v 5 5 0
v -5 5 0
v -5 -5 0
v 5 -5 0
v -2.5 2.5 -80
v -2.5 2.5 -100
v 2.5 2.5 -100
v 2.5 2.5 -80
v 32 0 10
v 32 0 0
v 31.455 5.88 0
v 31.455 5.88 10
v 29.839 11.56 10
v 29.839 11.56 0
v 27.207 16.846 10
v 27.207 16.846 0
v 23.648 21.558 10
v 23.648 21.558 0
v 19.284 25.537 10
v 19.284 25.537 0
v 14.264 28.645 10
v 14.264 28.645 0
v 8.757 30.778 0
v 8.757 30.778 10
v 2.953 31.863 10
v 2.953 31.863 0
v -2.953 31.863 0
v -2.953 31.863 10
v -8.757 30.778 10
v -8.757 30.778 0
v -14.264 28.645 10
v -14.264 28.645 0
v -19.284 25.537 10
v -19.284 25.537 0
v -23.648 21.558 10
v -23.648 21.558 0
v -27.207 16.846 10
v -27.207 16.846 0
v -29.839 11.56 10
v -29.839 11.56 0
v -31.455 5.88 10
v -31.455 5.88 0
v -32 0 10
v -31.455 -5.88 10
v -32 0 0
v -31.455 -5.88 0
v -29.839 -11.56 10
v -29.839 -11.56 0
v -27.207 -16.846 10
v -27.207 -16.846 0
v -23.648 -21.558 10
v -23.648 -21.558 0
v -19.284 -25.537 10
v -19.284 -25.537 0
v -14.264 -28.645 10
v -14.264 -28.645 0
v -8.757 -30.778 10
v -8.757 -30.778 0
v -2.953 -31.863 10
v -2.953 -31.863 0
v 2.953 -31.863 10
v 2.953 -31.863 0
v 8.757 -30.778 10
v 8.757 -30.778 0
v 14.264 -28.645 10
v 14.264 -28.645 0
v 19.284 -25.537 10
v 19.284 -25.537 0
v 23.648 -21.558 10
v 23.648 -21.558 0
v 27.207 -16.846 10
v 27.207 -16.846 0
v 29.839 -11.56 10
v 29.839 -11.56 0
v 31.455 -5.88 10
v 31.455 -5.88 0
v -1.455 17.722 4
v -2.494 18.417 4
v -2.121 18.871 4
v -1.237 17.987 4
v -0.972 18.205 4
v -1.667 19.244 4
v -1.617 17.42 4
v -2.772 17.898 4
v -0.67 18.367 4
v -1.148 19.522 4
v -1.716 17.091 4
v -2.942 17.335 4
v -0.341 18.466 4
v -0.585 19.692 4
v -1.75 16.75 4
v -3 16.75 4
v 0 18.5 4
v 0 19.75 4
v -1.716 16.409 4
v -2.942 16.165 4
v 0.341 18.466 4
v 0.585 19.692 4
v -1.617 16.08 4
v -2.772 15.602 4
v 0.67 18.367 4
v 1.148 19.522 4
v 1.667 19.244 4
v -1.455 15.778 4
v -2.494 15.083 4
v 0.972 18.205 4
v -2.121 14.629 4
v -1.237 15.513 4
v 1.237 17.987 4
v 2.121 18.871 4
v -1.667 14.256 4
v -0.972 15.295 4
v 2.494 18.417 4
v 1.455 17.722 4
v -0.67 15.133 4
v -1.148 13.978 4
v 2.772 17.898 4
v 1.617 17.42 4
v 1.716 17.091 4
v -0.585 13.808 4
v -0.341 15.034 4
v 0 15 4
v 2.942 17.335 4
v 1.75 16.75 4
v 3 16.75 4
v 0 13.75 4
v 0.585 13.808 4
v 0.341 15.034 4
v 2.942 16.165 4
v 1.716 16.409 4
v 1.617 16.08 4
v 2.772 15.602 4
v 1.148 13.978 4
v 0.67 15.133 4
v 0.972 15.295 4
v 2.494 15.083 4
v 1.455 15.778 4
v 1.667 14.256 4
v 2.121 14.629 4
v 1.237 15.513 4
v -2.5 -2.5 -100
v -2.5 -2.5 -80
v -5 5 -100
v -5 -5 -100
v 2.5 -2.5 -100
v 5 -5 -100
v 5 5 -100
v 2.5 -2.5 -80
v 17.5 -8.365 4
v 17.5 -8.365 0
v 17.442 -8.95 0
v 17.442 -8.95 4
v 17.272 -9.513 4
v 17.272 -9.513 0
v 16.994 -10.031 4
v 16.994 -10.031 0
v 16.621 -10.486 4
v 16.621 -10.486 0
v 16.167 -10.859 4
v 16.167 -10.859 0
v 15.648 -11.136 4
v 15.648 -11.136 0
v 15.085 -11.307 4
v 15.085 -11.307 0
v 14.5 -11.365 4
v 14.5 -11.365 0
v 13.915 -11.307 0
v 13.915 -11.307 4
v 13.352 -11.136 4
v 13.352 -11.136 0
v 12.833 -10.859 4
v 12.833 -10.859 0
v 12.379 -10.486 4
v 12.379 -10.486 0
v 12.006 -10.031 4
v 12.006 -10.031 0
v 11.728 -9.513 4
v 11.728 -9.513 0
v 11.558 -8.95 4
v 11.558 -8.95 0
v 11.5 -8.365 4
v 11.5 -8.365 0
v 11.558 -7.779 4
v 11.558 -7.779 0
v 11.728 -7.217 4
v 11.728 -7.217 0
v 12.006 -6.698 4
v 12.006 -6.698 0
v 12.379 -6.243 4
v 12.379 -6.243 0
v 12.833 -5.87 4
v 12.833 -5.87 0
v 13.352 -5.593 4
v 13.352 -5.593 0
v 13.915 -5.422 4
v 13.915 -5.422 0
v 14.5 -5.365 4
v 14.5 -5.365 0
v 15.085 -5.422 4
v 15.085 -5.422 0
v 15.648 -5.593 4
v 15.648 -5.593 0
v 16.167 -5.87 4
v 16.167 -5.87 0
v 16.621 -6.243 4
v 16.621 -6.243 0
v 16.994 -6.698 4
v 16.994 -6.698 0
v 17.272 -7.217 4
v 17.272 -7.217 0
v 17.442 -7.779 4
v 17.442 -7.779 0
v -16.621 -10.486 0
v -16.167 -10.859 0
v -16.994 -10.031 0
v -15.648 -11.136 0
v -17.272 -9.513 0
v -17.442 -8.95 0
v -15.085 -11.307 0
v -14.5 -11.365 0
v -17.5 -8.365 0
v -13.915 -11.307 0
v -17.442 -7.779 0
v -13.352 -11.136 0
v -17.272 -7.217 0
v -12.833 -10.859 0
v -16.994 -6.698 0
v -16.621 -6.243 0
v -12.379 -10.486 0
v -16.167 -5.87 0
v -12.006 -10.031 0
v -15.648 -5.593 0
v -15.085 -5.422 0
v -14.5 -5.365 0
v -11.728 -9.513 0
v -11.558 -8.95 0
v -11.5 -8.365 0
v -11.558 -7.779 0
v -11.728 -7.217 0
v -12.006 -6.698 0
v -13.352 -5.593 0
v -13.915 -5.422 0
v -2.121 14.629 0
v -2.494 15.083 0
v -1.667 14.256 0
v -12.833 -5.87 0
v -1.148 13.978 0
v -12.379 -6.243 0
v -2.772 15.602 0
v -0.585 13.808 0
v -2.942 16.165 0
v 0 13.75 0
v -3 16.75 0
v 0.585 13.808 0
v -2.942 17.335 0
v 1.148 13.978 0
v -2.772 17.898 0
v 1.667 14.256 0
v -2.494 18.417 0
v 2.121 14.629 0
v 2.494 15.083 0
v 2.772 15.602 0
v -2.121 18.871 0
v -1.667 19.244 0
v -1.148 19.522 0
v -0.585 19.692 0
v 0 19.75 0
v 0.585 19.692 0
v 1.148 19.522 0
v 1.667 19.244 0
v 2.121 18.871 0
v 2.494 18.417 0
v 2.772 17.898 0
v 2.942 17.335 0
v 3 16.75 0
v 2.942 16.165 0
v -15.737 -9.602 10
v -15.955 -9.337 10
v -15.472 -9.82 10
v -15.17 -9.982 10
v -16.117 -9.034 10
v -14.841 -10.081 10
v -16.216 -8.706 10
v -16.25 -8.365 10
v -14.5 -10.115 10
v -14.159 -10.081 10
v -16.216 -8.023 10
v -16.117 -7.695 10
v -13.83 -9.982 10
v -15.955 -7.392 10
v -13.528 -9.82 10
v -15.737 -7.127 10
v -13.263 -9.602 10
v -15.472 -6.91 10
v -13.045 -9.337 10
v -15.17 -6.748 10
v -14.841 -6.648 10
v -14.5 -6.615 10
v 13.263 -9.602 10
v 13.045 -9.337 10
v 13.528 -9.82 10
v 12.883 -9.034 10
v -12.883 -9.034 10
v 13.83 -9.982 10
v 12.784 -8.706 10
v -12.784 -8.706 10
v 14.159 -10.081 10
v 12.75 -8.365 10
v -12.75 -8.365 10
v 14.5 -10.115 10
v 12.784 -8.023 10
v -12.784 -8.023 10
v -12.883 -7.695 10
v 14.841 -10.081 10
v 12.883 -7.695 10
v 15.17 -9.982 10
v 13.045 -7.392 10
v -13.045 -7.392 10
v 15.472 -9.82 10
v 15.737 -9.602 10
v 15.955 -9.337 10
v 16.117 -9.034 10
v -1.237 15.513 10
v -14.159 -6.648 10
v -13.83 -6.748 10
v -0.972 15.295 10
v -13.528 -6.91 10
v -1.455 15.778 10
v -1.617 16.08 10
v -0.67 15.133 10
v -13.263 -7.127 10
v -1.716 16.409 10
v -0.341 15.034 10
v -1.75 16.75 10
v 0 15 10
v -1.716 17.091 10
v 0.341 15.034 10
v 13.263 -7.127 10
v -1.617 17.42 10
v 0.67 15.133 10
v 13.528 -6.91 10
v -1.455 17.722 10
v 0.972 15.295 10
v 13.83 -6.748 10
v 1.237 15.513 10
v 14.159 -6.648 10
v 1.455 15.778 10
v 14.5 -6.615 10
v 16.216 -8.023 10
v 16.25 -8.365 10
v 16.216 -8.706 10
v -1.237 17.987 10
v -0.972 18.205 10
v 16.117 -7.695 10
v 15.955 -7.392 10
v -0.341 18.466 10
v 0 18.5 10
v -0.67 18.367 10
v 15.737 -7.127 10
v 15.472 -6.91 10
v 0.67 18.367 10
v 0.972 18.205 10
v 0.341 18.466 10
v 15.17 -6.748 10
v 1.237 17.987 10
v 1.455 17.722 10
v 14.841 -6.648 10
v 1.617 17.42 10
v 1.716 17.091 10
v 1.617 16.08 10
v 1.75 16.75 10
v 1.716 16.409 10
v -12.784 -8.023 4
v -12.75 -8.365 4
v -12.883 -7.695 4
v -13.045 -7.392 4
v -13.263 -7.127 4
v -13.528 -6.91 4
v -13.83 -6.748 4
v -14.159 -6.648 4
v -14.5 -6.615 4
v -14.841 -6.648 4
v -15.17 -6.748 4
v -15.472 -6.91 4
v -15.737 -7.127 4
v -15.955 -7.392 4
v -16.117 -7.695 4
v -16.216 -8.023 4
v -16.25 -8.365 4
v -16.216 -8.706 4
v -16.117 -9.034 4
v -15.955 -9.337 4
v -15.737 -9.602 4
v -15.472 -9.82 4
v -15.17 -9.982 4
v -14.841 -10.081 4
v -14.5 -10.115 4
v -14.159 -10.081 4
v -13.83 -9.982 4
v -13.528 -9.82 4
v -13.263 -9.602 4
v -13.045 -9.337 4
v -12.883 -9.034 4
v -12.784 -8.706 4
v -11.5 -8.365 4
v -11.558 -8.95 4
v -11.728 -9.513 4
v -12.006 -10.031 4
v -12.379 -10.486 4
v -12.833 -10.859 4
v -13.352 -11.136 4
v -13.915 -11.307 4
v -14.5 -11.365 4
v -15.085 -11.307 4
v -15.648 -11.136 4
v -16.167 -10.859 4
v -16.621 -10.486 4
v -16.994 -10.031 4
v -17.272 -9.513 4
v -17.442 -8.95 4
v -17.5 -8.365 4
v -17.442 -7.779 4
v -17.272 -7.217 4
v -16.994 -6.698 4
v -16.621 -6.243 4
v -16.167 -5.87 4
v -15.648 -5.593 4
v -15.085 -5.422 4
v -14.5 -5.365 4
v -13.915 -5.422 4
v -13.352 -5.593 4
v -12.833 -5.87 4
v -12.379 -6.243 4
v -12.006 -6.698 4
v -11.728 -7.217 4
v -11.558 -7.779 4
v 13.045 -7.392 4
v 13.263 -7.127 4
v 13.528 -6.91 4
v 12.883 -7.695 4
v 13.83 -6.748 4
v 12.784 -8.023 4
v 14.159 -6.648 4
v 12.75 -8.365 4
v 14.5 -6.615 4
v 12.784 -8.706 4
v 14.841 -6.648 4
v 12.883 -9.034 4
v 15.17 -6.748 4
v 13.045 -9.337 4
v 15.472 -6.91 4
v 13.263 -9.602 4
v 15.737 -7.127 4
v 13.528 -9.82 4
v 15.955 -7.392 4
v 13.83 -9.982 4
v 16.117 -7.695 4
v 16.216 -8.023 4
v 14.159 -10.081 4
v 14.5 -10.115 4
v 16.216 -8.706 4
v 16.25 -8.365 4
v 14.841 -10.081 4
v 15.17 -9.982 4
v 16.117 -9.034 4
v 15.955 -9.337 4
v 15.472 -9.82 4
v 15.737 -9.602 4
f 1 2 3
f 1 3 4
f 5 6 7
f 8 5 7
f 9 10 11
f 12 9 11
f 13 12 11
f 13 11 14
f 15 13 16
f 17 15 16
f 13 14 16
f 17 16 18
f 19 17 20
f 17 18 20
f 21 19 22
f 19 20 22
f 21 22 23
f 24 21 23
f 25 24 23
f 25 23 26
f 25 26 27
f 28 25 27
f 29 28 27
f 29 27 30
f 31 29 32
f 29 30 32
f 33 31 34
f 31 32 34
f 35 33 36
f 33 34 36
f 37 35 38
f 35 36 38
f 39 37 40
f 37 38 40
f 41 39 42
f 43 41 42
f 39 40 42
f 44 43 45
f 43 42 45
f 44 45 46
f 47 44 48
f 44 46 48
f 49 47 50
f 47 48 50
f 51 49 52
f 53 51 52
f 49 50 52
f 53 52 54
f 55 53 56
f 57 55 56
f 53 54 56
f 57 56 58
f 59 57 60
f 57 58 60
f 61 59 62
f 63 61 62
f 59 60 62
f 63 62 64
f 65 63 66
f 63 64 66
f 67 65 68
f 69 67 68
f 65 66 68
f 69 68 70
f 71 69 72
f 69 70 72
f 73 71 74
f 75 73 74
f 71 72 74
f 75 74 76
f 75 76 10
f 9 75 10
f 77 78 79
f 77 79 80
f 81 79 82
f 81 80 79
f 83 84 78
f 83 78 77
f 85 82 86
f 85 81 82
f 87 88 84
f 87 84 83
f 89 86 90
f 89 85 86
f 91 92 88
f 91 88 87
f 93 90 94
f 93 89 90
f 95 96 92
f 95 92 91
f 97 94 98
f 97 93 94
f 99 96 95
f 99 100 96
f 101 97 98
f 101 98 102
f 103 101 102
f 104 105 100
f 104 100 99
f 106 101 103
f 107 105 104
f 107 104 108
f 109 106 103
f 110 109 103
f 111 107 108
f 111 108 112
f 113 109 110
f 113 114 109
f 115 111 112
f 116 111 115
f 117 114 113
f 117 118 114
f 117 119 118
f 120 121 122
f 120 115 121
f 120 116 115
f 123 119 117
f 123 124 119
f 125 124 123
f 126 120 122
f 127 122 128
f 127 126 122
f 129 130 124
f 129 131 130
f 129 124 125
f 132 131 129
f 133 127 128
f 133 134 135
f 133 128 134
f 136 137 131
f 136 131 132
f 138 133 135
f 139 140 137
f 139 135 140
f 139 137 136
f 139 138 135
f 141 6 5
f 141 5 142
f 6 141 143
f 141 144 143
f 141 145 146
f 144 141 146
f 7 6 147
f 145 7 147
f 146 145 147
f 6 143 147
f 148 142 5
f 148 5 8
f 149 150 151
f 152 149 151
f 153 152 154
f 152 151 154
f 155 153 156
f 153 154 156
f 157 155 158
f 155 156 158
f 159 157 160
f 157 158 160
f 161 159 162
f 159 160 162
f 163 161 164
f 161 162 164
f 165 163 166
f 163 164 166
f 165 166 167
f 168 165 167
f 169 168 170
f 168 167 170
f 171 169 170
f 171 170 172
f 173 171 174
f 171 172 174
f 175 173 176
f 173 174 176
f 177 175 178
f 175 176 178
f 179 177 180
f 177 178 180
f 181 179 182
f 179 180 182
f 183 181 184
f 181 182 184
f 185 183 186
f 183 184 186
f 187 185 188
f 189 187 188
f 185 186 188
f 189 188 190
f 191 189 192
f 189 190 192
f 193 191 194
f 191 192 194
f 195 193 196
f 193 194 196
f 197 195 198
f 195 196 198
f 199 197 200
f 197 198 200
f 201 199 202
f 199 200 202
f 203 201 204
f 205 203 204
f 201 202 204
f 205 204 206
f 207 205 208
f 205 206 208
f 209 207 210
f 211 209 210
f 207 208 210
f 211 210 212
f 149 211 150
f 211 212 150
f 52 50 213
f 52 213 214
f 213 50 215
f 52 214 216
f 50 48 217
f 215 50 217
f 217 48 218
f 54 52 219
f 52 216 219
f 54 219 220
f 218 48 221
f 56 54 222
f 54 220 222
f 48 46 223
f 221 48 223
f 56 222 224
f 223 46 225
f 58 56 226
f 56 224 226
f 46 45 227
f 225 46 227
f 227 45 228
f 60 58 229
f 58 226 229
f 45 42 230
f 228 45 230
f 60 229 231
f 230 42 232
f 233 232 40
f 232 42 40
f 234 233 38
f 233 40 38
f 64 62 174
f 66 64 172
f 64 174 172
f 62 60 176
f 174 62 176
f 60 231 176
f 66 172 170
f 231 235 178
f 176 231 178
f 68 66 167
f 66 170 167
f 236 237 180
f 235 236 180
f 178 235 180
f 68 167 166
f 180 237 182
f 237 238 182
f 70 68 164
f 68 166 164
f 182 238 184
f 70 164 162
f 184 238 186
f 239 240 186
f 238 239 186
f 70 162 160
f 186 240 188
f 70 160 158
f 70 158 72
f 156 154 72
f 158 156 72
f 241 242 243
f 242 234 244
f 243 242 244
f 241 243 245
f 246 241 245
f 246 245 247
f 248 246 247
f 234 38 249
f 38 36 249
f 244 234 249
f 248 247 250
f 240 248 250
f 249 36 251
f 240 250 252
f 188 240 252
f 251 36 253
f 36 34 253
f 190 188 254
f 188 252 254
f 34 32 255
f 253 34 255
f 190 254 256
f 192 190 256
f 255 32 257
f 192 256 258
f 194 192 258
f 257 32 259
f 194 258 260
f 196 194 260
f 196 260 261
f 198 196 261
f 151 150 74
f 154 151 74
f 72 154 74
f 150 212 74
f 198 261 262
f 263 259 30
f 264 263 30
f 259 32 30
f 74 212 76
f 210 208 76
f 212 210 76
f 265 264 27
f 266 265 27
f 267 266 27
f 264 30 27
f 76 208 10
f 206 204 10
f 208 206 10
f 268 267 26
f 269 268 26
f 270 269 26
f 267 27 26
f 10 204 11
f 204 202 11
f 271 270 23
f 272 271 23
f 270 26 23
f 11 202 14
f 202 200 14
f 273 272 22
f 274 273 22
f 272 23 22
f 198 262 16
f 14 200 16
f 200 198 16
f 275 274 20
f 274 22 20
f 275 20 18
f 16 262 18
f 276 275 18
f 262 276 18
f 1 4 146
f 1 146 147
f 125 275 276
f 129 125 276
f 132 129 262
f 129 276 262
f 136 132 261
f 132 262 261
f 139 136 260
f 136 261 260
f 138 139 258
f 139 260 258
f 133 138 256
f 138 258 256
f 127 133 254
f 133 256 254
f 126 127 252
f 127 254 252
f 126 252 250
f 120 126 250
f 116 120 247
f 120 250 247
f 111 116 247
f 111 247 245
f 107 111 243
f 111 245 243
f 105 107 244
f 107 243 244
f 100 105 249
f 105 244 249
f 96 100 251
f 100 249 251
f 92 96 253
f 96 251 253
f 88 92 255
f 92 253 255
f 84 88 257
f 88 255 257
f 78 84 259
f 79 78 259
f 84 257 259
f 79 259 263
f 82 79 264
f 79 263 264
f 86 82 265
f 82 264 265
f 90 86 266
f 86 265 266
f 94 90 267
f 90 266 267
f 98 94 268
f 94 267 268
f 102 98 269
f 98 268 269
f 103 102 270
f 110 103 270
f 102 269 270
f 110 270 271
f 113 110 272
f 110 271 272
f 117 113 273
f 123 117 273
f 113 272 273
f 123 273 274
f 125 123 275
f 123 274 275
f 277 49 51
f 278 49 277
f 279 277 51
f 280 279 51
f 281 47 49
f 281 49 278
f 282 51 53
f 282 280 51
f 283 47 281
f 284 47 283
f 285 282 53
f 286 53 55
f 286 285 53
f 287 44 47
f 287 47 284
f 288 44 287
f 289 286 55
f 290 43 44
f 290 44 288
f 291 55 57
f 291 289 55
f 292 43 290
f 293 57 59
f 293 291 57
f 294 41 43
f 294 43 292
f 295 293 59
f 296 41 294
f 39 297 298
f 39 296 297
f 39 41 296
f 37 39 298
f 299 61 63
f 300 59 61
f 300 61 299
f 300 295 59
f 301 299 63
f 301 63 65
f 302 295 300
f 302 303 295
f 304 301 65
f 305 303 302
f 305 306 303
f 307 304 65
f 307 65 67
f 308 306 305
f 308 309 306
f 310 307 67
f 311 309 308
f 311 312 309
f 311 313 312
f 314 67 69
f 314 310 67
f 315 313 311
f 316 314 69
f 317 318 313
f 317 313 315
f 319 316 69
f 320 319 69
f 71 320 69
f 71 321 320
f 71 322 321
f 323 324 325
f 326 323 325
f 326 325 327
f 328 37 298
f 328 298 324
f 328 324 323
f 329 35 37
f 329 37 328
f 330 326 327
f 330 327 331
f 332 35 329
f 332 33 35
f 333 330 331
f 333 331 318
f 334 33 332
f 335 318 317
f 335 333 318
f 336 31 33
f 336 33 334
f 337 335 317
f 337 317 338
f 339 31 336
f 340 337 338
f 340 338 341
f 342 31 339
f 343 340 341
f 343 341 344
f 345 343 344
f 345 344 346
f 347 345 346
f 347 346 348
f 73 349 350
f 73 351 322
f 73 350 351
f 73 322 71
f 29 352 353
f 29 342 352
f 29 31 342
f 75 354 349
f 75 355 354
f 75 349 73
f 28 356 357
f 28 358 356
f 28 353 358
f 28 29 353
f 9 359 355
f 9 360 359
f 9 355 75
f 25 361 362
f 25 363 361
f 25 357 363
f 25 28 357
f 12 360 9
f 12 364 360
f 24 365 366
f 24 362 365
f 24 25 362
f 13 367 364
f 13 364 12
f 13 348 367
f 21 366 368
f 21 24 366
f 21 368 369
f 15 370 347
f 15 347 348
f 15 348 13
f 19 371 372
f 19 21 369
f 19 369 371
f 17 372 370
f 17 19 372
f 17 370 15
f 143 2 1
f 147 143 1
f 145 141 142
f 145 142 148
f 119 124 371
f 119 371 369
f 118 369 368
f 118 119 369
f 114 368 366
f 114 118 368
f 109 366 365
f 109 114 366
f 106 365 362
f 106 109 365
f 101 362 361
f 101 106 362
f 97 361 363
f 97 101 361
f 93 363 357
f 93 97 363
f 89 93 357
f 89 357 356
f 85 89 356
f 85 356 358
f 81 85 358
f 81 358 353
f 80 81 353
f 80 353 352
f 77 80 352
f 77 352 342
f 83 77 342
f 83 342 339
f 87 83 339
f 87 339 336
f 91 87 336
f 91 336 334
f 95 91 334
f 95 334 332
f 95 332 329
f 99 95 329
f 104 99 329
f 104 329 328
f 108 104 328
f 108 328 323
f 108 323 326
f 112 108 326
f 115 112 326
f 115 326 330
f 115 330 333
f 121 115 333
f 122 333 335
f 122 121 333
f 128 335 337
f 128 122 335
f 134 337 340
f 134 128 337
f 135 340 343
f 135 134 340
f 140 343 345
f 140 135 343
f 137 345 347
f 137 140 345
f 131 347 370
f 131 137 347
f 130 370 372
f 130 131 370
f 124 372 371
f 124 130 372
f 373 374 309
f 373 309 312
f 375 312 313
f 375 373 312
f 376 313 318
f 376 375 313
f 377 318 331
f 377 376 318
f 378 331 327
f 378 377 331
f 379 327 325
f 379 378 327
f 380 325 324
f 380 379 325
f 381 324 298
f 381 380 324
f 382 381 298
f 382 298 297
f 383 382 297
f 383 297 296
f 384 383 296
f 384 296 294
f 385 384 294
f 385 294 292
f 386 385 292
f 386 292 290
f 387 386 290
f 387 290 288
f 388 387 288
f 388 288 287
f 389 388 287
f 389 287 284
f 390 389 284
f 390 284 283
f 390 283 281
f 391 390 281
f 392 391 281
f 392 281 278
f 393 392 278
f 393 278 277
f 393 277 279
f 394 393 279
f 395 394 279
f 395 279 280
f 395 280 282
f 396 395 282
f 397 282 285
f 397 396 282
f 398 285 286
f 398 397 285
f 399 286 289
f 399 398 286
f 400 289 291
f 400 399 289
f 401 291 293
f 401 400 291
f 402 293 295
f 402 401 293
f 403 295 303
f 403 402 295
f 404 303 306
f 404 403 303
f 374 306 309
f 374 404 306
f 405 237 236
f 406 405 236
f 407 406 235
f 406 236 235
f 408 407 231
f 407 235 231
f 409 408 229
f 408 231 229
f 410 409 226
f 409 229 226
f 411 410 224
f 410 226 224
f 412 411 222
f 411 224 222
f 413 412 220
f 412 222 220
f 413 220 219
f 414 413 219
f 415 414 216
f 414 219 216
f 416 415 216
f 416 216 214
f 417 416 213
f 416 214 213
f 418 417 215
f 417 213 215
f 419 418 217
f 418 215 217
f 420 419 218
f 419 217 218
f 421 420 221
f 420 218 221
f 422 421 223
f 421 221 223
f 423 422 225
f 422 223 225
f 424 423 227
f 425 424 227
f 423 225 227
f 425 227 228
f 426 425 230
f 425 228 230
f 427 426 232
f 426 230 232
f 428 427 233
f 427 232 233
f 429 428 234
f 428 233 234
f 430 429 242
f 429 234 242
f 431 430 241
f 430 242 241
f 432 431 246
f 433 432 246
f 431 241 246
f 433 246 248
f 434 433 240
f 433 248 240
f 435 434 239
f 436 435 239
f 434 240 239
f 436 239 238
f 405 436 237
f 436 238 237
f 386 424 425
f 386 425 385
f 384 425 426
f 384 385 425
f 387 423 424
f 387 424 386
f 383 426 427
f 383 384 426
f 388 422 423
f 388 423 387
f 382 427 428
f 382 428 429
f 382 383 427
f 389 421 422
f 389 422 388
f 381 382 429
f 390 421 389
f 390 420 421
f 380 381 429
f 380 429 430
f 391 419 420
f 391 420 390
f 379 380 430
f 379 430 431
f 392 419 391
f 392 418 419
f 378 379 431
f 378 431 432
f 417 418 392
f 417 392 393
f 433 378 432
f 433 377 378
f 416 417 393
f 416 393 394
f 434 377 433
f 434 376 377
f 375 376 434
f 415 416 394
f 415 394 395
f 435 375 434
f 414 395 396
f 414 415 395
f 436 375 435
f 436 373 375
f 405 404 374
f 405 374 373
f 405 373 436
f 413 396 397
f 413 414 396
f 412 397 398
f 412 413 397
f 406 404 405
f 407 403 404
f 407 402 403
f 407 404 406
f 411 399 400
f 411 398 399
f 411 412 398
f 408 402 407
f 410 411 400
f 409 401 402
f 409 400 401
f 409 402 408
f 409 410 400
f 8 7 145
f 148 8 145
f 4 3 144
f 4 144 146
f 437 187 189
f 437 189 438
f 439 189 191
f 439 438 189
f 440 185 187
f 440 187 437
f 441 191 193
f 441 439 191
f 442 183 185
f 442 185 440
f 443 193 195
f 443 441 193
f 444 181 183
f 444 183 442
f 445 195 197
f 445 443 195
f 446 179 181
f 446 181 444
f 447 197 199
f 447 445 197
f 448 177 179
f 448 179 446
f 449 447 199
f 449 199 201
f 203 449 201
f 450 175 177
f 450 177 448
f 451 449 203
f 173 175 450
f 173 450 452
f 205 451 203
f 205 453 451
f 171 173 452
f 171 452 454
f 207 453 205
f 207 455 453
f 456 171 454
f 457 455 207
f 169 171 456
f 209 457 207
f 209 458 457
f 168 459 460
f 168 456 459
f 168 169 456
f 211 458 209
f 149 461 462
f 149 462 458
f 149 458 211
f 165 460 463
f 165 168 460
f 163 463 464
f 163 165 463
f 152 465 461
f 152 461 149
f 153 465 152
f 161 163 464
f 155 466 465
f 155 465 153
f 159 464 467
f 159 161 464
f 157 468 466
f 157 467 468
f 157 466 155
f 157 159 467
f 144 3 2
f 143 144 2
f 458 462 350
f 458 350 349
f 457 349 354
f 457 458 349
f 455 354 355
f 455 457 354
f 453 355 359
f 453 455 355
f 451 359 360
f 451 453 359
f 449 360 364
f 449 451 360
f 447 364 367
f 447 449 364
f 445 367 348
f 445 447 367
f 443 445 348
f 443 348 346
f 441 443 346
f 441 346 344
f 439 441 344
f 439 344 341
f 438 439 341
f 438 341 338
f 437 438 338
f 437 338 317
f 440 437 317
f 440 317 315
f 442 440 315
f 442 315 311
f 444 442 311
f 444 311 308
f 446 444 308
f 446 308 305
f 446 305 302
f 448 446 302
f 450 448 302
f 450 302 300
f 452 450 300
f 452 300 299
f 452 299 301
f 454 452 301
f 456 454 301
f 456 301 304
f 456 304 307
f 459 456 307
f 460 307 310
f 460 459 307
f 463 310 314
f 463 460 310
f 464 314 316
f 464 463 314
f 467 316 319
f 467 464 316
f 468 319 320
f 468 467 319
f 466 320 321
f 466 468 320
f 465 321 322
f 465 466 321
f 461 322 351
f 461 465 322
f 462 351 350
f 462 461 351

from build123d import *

# Parameters (mm, degrees)
SKETCH_R        = 32
SKETCH_R_2      = 1.75
PAD_DEPTH       = 10
SKETCH003_R     = 3
POCKET001_DEPTH = 4
SKETCH001_W     = 10
SKETCH001_H     = 10
PAD001_DEPTH    = 100
SKETCH002_W     = 5
SKETCH002_H     = 5
POCKET_DEPTH    = 20


with BuildPart() as body:
    # Sketch → Pad (new body)
    with BuildSketch(Plane.XY):
        Circle(SKETCH_R)
        with Locations((0, 16.75)):
            Circle(SKETCH_R_2, mode=Mode.SUBTRACT)
        with Locations((-14.5, -8.364737)):
            Circle(SKETCH_R_2, mode=Mode.SUBTRACT)
        with Locations((14.5, -8.364737)):
            Circle(SKETCH_R_2, mode=Mode.SUBTRACT)
    extrude(amount=PAD_DEPTH)

    # Sketch003 (on DatumPlane) → Pocket001 (cut)
    with BuildSketch(Plane(origin=(0, 0, 0), x_dir=(1, 0, 0), z_dir=(0, 0, -1))):
        with Locations((-14.5, 8.364737)):
            Circle(SKETCH003_R)
        with Locations((14.5, 8.364737)):
            Circle(SKETCH003_R)
        with Locations((0, -16.75)):
            Circle(SKETCH003_R)
    extrude(amount=-POCKET001_DEPTH, mode=Mode.SUBTRACT)


with BuildPart() as body001:
    # Sketch001 → Pad001 (new body)
    with BuildSketch(Plane.XY):
        Rectangle(SKETCH001_W, SKETCH001_H)
    extrude(amount=-PAD001_DEPTH)

    # Sketch002 (on DatumPlane) → Pocket (cut)
    with BuildSketch(Plane(origin=(0, 0, -100), x_dir=(1, 0, 0), z_dir=(0, 0, -1))):
        Rectangle(SKETCH002_W, SKETCH002_H)
    extrude(amount=-POCKET_DEPTH, mode=Mode.SUBTRACT)


solid = Compound([body.part, body001.part])
